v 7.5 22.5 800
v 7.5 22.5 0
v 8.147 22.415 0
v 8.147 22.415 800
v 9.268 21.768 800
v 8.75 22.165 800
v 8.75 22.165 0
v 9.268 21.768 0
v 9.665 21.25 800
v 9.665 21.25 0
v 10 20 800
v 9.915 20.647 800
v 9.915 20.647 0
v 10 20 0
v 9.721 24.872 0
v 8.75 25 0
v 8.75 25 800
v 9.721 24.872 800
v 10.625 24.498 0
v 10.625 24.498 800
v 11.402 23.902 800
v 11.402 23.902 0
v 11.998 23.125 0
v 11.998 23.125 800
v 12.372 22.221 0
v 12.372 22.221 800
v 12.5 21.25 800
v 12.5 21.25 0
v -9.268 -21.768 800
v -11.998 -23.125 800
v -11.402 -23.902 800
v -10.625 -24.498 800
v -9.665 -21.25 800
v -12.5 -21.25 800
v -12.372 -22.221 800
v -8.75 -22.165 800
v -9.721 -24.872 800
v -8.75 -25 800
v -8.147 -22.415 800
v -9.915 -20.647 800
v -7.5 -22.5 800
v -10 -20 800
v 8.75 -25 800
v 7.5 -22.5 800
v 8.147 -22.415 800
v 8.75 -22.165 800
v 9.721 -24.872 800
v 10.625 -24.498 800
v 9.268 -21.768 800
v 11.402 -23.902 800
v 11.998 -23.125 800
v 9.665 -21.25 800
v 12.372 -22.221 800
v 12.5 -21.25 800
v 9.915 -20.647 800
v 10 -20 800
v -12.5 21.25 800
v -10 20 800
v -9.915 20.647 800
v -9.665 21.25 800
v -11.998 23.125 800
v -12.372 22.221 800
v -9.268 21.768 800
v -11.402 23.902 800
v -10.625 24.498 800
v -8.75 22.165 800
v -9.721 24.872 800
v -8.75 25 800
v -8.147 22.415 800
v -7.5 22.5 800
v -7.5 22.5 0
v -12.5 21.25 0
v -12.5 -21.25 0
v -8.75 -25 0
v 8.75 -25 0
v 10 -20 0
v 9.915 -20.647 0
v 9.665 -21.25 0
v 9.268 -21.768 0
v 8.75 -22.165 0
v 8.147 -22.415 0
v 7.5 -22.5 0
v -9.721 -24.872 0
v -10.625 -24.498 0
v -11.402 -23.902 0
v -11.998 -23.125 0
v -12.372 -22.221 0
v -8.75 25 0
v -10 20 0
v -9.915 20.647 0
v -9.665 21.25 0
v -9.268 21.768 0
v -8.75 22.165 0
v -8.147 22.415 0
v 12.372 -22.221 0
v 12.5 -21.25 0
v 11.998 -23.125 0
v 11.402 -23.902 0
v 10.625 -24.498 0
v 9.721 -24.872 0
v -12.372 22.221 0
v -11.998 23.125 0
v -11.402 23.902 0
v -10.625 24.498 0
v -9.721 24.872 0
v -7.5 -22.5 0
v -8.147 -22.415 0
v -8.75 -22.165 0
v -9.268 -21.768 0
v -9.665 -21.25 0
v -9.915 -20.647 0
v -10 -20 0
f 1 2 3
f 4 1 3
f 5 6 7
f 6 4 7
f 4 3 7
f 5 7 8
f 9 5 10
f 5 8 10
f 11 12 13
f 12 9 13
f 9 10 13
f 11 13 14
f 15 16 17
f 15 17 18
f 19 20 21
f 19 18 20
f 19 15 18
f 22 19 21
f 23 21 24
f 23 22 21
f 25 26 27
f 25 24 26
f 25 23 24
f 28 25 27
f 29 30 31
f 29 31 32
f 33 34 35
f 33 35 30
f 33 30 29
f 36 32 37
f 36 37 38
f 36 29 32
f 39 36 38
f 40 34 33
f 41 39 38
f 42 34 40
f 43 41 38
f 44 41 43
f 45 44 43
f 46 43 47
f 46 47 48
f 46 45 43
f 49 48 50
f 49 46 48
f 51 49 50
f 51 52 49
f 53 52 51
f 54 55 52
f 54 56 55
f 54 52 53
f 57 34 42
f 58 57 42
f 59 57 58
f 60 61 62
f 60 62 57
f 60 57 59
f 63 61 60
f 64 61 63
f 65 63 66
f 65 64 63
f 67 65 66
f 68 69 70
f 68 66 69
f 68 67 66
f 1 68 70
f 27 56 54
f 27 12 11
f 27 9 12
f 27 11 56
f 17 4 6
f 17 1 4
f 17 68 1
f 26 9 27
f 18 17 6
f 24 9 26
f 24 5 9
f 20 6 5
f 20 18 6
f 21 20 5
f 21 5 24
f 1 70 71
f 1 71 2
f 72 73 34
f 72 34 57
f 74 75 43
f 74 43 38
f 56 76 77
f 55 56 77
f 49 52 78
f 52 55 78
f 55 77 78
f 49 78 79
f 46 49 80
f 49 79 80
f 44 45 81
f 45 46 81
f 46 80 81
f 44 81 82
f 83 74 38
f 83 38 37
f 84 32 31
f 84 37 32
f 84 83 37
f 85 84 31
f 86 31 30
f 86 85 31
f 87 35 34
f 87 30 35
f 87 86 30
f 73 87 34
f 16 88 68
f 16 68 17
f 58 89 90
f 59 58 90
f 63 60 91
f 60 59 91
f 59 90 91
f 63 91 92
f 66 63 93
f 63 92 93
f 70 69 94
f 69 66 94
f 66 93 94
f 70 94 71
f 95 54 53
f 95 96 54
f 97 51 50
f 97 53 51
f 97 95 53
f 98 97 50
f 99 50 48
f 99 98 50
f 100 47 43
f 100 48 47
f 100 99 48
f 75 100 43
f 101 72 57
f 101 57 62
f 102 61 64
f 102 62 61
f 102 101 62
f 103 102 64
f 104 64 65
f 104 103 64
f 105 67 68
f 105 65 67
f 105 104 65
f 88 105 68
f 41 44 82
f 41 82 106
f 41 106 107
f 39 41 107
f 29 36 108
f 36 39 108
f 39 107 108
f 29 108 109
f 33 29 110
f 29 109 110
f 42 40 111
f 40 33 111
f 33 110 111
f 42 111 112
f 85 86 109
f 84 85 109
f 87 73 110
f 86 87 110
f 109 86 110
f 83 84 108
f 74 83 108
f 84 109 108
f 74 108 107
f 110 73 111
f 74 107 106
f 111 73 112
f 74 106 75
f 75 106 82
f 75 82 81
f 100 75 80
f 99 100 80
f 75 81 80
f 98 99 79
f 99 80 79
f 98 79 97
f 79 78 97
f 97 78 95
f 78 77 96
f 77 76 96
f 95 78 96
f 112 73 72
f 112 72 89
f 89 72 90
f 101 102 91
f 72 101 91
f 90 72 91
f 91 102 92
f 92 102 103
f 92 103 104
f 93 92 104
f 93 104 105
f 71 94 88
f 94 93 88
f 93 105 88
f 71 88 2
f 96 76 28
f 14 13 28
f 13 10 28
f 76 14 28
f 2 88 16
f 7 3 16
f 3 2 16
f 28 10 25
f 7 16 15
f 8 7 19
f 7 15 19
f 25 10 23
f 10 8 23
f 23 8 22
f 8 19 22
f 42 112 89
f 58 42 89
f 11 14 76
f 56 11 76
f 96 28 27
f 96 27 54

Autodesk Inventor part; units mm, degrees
ref_plane "YZ Plane" through (0, 0, 0) normal (1, 0, 0) x (0, 1, 0)
ref_plane "Plano inicial" through (0, 0, 0) normal (0, 0, 1) x (1, 0, 0)
ref_plane "Plano final" through (0, 0, 800) normal (0, 0, 1) x (1, 0, 0)
sketch "Esboço" plane through (0, 0, 0) normal (0, 0, 1) x (1, 0, 0)
  line L0 (-12.5, -21.25) -> (-12.5, 21.25)
  line L1 (-8.75, 25) -> (8.75, 25)
  line L2 (12.5, 21.25) -> (12.5, -21.25)
  line L3 (8.75, -25) -> (-8.75, -25)
  arc A0 (-12.5, -21.25) -> (-8.75, -25) centre (-8.75, -21.25) ccw
  arc A1 (-8.75, 25) -> (-12.5, 21.25) centre (-8.75, 21.25) ccw
  arc A2 (12.5, 21.25) -> (8.75, 25) centre (8.75, 21.25) ccw
  arc A3 (8.75, -25) -> (12.5, -21.25) centre (8.75, -21.25) ccw
  line L4 (-7.5, 22.5) -> (7.5, 22.5)
  line L5 (10, 20) -> (10, -20)
  line L6 (7.5, -22.5) -> (-7.5, -22.5)
  line L7 (-10, -20) -> (-10, 20)
  line L8 (0, 36.0873) -> (0, -36.0873) construction
  line L9 (-18.5873, 0) -> (18.5873, 0) construction
  arc A4 (-10, -20) -> (-7.5, -22.5) centre (-7.5, -20) ccw
  arc A5 (-7.5, 22.5) -> (-10, 20) centre (-7.5, 20) ccw
  arc A6 (10, 20) -> (7.5, 22.5) centre (7.5, 20) ccw
  arc A7 (7.5, -22.5) -> (10, -20) centre (7.5, -20) ccw
  dimension "d7" = 3.75
  dimension "d10" = 50
  dimension "d11" = 25
  dimension "d12" = 2.5
  dimension "d15" = 25
  dimension "d16" = 12.5
  dimension "d19" = 2.5
  dimension "d20" = 2.5
extrude "Corpo" add sketch "Esboço" along normal up to surface (800 mm away) from surface at 0
sketch "Sketch3" plane through (0, 0, 0) normal (0, 0, 1) x (1, 0, 0)
  line L0 (0, 0) -> (10, 0)
ref_plane "Work Plane3" through (0, 0, 0) normal (0, -1, 0) x (1, 0, 0)
sketch "Sketch4" plane through (0, 0, 0) normal (0, -1, 0) x (1, 0, 0)
  line L0 (-2, 0) -> (12, 0)
  line L1 (-2, 800) -> (12, 800)
  dimension "d18" = 800
equation "\"d7\" = G_IR"
equation "\"d10\" = G_H"
equation "\"d11\" = G_W"
equation "\"d12\" = G_T"
equation "\"d15\" = 0.5 * d10"
equation "\"d16\" = 0.5 * d11"
equation "\"d19\" = G_T"
equation "\"d20\" = G_T"
equation "\"d3\" = G_L"
equation "\"G_W\" = 25"
equation "\"G_H\" = 50"
equation "\"G_T\" = 2.5"
equation "\"G_IR\" = 3.75"
equation "\"G_L\" = d18"
equation "\"G_OFFSET_START\" = 0"
equation "\"G_OFFSET_END\" = 0"
properties part number "EN 10210-2 - 50 x 25 x 2,5 - 800" material "Aço, suave"
